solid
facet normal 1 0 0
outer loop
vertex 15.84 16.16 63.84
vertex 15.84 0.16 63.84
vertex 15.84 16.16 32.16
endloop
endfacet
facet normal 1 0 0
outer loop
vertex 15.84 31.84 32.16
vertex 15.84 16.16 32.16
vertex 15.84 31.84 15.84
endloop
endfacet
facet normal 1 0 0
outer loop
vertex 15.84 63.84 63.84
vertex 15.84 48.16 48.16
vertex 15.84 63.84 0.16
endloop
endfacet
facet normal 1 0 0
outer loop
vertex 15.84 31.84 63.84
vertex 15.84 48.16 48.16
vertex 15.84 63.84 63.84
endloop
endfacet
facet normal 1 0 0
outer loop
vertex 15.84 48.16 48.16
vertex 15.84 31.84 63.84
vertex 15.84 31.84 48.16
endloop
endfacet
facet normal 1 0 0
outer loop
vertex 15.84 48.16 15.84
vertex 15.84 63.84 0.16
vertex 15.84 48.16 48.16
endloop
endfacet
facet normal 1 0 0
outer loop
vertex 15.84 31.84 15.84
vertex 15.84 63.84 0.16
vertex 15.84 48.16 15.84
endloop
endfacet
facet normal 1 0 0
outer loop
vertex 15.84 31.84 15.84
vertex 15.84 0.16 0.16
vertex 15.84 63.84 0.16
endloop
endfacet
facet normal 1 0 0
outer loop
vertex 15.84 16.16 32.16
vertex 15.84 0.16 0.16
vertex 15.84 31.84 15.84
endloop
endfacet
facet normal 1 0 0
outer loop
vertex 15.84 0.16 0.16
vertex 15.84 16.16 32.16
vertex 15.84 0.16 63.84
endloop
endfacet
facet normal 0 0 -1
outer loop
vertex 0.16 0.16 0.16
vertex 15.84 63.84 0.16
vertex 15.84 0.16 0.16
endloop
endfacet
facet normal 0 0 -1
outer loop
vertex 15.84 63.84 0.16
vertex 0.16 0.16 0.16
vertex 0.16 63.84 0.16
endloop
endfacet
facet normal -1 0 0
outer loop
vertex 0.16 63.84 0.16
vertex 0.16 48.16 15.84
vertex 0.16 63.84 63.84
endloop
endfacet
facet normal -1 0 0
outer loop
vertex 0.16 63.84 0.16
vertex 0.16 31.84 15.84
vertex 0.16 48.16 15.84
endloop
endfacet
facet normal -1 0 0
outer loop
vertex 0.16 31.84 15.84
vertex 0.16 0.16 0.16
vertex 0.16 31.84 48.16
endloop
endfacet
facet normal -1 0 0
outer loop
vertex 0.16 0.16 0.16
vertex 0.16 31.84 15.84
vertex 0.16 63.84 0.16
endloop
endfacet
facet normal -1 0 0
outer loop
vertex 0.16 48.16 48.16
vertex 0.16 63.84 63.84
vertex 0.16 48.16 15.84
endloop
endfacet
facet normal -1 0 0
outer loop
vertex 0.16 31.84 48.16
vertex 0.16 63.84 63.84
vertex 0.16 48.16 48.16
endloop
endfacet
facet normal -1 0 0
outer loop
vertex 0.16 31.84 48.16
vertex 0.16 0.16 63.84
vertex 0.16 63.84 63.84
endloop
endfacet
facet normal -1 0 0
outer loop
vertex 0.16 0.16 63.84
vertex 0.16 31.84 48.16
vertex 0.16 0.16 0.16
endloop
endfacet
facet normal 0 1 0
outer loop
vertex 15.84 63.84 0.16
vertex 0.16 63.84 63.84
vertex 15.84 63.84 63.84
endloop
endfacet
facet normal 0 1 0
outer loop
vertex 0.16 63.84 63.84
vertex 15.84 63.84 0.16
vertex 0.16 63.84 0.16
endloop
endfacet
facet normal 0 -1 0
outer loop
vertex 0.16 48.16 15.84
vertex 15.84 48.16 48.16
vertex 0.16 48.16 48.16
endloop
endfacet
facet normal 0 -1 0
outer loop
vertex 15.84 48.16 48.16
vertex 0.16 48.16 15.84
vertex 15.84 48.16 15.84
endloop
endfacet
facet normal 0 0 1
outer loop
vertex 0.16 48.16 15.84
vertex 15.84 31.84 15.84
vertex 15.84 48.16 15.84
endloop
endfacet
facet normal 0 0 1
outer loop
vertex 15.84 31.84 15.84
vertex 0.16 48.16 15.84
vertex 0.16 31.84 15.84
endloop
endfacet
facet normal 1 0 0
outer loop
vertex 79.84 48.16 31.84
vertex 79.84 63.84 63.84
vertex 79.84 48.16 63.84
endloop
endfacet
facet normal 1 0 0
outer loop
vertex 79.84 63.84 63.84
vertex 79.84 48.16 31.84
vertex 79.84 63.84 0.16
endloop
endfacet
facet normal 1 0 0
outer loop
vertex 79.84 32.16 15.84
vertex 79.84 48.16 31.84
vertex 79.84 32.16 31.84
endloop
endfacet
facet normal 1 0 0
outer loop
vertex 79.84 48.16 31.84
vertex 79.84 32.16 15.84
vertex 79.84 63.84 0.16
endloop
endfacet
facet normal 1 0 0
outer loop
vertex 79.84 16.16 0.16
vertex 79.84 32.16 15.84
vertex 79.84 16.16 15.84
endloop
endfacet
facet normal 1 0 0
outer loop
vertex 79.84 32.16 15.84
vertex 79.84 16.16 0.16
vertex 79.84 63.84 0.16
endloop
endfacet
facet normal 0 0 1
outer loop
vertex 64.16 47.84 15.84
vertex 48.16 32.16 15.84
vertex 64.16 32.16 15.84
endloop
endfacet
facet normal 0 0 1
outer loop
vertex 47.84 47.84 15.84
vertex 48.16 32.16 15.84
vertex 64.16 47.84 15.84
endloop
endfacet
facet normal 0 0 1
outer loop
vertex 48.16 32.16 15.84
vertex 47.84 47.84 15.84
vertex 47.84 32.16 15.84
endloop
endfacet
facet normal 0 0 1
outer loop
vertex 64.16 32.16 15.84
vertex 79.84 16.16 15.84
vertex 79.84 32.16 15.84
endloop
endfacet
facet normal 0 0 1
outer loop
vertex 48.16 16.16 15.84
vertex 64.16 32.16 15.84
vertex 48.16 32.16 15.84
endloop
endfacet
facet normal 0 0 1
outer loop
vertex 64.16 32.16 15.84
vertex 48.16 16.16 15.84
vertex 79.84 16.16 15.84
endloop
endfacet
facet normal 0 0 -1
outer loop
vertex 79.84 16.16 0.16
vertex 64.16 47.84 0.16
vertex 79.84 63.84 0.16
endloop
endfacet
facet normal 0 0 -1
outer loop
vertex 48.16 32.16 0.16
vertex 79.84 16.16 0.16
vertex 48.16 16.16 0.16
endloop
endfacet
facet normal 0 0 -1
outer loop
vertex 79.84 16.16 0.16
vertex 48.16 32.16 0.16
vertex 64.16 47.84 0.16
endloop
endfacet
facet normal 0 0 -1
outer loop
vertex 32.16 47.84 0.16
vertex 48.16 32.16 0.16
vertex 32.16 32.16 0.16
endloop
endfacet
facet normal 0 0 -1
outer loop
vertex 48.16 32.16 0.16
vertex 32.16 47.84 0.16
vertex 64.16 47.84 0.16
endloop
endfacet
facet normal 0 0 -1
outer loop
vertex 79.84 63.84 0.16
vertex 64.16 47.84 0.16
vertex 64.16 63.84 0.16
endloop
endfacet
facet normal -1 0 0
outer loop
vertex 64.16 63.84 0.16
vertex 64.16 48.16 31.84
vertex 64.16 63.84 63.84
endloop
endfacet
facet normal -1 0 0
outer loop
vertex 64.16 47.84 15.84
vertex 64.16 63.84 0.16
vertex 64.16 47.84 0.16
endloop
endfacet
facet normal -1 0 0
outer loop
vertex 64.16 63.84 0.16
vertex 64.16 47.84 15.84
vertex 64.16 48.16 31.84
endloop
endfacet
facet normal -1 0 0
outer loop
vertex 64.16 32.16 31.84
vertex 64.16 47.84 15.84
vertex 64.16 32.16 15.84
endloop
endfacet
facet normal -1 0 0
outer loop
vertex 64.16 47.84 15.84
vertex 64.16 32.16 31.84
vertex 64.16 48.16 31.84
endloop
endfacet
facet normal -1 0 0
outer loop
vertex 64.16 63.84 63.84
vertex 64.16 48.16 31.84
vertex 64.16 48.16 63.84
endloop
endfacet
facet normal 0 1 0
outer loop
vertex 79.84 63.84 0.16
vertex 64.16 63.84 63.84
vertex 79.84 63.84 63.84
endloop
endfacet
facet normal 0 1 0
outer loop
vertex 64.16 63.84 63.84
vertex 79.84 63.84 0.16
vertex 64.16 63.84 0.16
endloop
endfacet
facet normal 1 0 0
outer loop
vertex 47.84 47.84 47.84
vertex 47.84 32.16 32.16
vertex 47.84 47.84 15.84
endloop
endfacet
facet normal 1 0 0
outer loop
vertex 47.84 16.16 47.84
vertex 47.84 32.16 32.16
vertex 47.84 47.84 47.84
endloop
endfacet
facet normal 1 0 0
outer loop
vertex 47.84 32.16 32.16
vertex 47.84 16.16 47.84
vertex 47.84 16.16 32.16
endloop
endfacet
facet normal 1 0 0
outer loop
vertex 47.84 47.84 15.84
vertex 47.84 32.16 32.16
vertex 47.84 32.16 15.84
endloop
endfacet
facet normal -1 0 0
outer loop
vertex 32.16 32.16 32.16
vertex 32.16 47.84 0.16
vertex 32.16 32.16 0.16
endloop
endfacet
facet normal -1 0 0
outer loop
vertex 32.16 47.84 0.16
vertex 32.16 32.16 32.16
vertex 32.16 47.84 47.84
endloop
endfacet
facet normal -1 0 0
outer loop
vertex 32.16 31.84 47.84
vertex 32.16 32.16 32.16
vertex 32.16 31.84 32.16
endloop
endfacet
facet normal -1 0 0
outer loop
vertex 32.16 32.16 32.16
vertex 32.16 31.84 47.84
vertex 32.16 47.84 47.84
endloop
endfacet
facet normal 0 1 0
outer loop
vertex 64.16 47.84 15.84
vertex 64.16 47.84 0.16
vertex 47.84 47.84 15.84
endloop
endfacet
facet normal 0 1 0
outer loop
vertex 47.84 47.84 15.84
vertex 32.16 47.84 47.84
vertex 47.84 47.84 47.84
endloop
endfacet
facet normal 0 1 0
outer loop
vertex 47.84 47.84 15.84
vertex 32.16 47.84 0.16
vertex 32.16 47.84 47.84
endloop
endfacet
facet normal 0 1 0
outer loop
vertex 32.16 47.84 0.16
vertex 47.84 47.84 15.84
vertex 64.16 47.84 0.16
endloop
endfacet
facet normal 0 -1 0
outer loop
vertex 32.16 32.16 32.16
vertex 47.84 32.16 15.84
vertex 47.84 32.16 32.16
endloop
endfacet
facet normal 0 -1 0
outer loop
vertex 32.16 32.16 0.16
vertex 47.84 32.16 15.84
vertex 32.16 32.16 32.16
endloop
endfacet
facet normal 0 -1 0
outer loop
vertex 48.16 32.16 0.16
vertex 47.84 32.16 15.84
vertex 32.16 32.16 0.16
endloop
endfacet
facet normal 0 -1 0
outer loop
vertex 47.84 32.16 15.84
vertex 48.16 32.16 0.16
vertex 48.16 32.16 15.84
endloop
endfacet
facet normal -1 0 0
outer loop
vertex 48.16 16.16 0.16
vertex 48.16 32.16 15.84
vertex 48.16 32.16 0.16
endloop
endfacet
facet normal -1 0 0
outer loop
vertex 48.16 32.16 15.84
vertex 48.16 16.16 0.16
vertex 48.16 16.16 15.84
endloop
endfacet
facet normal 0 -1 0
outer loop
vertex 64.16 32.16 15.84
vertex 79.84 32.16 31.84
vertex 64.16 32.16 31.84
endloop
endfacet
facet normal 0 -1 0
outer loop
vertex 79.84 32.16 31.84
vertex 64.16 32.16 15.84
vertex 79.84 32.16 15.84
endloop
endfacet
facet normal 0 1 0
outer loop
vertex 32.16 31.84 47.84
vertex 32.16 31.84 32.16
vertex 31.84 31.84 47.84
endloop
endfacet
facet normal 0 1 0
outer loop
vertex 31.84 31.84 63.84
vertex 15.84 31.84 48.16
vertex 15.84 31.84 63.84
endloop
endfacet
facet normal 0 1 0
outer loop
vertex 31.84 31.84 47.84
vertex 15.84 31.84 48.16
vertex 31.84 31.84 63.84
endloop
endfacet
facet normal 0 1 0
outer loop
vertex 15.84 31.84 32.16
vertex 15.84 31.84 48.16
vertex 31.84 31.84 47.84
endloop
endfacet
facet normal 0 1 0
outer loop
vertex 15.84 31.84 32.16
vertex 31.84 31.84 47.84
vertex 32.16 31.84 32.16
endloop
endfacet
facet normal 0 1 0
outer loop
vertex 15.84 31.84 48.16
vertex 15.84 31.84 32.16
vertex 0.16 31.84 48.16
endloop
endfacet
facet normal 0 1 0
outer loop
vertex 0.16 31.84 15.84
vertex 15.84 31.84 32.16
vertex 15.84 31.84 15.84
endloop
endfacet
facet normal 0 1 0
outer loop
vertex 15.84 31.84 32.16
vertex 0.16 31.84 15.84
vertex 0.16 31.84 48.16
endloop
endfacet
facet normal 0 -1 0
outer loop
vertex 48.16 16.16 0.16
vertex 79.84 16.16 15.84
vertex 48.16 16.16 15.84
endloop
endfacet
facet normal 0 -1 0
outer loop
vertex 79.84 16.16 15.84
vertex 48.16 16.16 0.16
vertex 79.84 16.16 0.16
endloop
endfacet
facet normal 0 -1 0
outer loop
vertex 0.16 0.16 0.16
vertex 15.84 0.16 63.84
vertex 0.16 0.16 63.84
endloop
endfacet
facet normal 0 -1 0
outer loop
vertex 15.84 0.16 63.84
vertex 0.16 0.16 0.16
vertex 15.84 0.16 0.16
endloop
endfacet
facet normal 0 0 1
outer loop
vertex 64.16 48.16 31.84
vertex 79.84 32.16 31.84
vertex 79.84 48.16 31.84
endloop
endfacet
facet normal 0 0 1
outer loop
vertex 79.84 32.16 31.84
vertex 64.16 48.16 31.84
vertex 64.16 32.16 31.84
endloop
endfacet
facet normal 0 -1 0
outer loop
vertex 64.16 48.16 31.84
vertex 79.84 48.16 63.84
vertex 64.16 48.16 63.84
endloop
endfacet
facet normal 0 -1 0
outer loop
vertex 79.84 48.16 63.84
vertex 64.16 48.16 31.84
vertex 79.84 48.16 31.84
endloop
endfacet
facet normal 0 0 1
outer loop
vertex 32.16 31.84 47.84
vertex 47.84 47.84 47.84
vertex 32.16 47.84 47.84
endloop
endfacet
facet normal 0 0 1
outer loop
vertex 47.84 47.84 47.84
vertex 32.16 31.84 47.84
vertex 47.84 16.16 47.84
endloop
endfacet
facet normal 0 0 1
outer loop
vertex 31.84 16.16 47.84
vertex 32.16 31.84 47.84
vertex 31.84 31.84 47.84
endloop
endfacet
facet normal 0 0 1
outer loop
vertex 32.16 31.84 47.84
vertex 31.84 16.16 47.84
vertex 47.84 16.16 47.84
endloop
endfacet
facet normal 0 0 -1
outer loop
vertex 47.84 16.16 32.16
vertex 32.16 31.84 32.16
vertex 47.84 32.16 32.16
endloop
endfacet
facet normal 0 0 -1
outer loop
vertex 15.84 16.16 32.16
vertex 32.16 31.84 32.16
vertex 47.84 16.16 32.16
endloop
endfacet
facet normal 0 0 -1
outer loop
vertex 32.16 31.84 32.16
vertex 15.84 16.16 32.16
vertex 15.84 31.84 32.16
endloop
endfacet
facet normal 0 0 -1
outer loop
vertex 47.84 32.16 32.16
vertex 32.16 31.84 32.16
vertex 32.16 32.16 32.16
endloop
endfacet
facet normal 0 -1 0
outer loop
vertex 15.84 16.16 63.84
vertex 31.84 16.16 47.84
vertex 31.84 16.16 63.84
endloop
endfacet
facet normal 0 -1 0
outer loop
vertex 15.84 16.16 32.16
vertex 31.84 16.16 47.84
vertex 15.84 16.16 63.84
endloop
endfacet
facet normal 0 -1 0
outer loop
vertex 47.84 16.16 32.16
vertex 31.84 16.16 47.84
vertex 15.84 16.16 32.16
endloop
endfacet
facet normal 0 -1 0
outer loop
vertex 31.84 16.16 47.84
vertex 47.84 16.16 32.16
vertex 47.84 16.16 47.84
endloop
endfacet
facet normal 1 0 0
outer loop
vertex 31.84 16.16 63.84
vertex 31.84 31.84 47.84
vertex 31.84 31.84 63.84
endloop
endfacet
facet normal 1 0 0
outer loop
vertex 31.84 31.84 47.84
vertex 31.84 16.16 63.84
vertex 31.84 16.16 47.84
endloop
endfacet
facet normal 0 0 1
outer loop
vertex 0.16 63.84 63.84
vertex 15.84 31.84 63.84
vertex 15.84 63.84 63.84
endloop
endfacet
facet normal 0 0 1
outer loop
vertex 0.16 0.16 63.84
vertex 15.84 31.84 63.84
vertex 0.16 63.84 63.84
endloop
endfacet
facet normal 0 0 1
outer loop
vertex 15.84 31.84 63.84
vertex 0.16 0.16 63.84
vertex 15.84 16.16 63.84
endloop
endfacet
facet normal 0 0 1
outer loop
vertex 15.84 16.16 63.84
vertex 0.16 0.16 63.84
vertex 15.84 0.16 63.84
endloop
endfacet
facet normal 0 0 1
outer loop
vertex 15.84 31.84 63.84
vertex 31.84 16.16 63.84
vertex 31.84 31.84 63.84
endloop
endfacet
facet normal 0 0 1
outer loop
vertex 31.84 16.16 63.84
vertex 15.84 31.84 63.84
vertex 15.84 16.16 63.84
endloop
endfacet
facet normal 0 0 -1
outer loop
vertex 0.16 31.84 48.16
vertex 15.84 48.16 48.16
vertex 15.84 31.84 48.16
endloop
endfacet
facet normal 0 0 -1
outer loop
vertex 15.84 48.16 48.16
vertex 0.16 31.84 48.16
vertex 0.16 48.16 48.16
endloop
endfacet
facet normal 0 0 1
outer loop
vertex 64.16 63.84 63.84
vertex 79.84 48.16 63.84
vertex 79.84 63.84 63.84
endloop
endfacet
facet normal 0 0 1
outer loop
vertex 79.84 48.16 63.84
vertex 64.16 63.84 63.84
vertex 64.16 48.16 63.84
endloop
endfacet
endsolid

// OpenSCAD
l = 16;
e = 0.16;
g = 3;

module m(v,w) { translate(v*l+[e,e,e]-3*e*w) cube((l-2*e)*[1,1,1]+(6*e-l)*w); }

module a(i,j,k) { m([i,j,k],[0,0,0]); }
module bx(i,j,k) { m([i,j,k],[1,0,0]); }
module by(i,j,k) { m([i,j,k],[0,1,0]); }
module bz(i,j,k) { m([i,j,k],[0,0,1]); }
module cx(i,j,k) { m([i,j,k],[0,1,1]); }
module cy(i,j,k) { m([i,j,k],[1,0,1]); }
module cz(i,j,k) { m([i,j,k],[1,1,0]); }
module d(i,j,k) { m([i,j,k],[1,1,1]); }

module p() {
  a(0,3,0);
  by(0,3,0);
  a(4,3,0);
  by(4,3,0);
  a(0,2,0);
  by(0,2,0);
  a(2,2,0);
  a(3,2,0);
  bx(3,2,0);
  by(3,2,0);
  a(4,2,0);
  bx(4,2,0);
  cz(4,2,0);
  by(4,2,0);
  a(0,1,0);
  by(0,1,0);
  a(3,1,0);
  a(4,1,0);
  bx(4,1,0);
  a(0,0,0);
  a(0,3,1);
  bz(0,3,1);
  a(4,3,1);
  by(4,3,1);
  cx(4,3,1);
  bz(4,3,1);
  a(2,2,1);
  bz(2,2,1);
  a(4,2,1);
  bz(4,2,1);
  a(0,1,1);
  by(0,1,1);
  cx(0,1,1);
  bz(0,1,1);
  a(0,0,1);
  bz(0,0,1);
  a(0,3,2);
  bz(0,3,2);
  a(4,3,2);
  bz(4,3,2);
  a(2,2,2);
  by(2,2,2);
  bz(2,2,2);
  a(0,1,2);
  by(0,1,2);
  cx(0,1,2);
  bz(0,1,2);
  a(1,1,2);
  bx(1,1,2);
  a(2,1,2);
  bx(2,1,2);
  a(0,0,2);
  bz(0,0,2);
  a(0,3,3);
  by(0,3,3);
  bz(0,3,3);
  a(4,3,3);
  bz(4,3,3);
  a(0,2,3);
  by(0,2,3);
  a(0,1,3);
  by(0,1,3);
  cx(0,1,3);
  bz(0,1,3);
  a(1,1,3);
  bx(1,1,3);
  cy(1,1,3);
  bz(1,1,3);
  a(0,0,3);
  bz(0,0,3);
}
p();
